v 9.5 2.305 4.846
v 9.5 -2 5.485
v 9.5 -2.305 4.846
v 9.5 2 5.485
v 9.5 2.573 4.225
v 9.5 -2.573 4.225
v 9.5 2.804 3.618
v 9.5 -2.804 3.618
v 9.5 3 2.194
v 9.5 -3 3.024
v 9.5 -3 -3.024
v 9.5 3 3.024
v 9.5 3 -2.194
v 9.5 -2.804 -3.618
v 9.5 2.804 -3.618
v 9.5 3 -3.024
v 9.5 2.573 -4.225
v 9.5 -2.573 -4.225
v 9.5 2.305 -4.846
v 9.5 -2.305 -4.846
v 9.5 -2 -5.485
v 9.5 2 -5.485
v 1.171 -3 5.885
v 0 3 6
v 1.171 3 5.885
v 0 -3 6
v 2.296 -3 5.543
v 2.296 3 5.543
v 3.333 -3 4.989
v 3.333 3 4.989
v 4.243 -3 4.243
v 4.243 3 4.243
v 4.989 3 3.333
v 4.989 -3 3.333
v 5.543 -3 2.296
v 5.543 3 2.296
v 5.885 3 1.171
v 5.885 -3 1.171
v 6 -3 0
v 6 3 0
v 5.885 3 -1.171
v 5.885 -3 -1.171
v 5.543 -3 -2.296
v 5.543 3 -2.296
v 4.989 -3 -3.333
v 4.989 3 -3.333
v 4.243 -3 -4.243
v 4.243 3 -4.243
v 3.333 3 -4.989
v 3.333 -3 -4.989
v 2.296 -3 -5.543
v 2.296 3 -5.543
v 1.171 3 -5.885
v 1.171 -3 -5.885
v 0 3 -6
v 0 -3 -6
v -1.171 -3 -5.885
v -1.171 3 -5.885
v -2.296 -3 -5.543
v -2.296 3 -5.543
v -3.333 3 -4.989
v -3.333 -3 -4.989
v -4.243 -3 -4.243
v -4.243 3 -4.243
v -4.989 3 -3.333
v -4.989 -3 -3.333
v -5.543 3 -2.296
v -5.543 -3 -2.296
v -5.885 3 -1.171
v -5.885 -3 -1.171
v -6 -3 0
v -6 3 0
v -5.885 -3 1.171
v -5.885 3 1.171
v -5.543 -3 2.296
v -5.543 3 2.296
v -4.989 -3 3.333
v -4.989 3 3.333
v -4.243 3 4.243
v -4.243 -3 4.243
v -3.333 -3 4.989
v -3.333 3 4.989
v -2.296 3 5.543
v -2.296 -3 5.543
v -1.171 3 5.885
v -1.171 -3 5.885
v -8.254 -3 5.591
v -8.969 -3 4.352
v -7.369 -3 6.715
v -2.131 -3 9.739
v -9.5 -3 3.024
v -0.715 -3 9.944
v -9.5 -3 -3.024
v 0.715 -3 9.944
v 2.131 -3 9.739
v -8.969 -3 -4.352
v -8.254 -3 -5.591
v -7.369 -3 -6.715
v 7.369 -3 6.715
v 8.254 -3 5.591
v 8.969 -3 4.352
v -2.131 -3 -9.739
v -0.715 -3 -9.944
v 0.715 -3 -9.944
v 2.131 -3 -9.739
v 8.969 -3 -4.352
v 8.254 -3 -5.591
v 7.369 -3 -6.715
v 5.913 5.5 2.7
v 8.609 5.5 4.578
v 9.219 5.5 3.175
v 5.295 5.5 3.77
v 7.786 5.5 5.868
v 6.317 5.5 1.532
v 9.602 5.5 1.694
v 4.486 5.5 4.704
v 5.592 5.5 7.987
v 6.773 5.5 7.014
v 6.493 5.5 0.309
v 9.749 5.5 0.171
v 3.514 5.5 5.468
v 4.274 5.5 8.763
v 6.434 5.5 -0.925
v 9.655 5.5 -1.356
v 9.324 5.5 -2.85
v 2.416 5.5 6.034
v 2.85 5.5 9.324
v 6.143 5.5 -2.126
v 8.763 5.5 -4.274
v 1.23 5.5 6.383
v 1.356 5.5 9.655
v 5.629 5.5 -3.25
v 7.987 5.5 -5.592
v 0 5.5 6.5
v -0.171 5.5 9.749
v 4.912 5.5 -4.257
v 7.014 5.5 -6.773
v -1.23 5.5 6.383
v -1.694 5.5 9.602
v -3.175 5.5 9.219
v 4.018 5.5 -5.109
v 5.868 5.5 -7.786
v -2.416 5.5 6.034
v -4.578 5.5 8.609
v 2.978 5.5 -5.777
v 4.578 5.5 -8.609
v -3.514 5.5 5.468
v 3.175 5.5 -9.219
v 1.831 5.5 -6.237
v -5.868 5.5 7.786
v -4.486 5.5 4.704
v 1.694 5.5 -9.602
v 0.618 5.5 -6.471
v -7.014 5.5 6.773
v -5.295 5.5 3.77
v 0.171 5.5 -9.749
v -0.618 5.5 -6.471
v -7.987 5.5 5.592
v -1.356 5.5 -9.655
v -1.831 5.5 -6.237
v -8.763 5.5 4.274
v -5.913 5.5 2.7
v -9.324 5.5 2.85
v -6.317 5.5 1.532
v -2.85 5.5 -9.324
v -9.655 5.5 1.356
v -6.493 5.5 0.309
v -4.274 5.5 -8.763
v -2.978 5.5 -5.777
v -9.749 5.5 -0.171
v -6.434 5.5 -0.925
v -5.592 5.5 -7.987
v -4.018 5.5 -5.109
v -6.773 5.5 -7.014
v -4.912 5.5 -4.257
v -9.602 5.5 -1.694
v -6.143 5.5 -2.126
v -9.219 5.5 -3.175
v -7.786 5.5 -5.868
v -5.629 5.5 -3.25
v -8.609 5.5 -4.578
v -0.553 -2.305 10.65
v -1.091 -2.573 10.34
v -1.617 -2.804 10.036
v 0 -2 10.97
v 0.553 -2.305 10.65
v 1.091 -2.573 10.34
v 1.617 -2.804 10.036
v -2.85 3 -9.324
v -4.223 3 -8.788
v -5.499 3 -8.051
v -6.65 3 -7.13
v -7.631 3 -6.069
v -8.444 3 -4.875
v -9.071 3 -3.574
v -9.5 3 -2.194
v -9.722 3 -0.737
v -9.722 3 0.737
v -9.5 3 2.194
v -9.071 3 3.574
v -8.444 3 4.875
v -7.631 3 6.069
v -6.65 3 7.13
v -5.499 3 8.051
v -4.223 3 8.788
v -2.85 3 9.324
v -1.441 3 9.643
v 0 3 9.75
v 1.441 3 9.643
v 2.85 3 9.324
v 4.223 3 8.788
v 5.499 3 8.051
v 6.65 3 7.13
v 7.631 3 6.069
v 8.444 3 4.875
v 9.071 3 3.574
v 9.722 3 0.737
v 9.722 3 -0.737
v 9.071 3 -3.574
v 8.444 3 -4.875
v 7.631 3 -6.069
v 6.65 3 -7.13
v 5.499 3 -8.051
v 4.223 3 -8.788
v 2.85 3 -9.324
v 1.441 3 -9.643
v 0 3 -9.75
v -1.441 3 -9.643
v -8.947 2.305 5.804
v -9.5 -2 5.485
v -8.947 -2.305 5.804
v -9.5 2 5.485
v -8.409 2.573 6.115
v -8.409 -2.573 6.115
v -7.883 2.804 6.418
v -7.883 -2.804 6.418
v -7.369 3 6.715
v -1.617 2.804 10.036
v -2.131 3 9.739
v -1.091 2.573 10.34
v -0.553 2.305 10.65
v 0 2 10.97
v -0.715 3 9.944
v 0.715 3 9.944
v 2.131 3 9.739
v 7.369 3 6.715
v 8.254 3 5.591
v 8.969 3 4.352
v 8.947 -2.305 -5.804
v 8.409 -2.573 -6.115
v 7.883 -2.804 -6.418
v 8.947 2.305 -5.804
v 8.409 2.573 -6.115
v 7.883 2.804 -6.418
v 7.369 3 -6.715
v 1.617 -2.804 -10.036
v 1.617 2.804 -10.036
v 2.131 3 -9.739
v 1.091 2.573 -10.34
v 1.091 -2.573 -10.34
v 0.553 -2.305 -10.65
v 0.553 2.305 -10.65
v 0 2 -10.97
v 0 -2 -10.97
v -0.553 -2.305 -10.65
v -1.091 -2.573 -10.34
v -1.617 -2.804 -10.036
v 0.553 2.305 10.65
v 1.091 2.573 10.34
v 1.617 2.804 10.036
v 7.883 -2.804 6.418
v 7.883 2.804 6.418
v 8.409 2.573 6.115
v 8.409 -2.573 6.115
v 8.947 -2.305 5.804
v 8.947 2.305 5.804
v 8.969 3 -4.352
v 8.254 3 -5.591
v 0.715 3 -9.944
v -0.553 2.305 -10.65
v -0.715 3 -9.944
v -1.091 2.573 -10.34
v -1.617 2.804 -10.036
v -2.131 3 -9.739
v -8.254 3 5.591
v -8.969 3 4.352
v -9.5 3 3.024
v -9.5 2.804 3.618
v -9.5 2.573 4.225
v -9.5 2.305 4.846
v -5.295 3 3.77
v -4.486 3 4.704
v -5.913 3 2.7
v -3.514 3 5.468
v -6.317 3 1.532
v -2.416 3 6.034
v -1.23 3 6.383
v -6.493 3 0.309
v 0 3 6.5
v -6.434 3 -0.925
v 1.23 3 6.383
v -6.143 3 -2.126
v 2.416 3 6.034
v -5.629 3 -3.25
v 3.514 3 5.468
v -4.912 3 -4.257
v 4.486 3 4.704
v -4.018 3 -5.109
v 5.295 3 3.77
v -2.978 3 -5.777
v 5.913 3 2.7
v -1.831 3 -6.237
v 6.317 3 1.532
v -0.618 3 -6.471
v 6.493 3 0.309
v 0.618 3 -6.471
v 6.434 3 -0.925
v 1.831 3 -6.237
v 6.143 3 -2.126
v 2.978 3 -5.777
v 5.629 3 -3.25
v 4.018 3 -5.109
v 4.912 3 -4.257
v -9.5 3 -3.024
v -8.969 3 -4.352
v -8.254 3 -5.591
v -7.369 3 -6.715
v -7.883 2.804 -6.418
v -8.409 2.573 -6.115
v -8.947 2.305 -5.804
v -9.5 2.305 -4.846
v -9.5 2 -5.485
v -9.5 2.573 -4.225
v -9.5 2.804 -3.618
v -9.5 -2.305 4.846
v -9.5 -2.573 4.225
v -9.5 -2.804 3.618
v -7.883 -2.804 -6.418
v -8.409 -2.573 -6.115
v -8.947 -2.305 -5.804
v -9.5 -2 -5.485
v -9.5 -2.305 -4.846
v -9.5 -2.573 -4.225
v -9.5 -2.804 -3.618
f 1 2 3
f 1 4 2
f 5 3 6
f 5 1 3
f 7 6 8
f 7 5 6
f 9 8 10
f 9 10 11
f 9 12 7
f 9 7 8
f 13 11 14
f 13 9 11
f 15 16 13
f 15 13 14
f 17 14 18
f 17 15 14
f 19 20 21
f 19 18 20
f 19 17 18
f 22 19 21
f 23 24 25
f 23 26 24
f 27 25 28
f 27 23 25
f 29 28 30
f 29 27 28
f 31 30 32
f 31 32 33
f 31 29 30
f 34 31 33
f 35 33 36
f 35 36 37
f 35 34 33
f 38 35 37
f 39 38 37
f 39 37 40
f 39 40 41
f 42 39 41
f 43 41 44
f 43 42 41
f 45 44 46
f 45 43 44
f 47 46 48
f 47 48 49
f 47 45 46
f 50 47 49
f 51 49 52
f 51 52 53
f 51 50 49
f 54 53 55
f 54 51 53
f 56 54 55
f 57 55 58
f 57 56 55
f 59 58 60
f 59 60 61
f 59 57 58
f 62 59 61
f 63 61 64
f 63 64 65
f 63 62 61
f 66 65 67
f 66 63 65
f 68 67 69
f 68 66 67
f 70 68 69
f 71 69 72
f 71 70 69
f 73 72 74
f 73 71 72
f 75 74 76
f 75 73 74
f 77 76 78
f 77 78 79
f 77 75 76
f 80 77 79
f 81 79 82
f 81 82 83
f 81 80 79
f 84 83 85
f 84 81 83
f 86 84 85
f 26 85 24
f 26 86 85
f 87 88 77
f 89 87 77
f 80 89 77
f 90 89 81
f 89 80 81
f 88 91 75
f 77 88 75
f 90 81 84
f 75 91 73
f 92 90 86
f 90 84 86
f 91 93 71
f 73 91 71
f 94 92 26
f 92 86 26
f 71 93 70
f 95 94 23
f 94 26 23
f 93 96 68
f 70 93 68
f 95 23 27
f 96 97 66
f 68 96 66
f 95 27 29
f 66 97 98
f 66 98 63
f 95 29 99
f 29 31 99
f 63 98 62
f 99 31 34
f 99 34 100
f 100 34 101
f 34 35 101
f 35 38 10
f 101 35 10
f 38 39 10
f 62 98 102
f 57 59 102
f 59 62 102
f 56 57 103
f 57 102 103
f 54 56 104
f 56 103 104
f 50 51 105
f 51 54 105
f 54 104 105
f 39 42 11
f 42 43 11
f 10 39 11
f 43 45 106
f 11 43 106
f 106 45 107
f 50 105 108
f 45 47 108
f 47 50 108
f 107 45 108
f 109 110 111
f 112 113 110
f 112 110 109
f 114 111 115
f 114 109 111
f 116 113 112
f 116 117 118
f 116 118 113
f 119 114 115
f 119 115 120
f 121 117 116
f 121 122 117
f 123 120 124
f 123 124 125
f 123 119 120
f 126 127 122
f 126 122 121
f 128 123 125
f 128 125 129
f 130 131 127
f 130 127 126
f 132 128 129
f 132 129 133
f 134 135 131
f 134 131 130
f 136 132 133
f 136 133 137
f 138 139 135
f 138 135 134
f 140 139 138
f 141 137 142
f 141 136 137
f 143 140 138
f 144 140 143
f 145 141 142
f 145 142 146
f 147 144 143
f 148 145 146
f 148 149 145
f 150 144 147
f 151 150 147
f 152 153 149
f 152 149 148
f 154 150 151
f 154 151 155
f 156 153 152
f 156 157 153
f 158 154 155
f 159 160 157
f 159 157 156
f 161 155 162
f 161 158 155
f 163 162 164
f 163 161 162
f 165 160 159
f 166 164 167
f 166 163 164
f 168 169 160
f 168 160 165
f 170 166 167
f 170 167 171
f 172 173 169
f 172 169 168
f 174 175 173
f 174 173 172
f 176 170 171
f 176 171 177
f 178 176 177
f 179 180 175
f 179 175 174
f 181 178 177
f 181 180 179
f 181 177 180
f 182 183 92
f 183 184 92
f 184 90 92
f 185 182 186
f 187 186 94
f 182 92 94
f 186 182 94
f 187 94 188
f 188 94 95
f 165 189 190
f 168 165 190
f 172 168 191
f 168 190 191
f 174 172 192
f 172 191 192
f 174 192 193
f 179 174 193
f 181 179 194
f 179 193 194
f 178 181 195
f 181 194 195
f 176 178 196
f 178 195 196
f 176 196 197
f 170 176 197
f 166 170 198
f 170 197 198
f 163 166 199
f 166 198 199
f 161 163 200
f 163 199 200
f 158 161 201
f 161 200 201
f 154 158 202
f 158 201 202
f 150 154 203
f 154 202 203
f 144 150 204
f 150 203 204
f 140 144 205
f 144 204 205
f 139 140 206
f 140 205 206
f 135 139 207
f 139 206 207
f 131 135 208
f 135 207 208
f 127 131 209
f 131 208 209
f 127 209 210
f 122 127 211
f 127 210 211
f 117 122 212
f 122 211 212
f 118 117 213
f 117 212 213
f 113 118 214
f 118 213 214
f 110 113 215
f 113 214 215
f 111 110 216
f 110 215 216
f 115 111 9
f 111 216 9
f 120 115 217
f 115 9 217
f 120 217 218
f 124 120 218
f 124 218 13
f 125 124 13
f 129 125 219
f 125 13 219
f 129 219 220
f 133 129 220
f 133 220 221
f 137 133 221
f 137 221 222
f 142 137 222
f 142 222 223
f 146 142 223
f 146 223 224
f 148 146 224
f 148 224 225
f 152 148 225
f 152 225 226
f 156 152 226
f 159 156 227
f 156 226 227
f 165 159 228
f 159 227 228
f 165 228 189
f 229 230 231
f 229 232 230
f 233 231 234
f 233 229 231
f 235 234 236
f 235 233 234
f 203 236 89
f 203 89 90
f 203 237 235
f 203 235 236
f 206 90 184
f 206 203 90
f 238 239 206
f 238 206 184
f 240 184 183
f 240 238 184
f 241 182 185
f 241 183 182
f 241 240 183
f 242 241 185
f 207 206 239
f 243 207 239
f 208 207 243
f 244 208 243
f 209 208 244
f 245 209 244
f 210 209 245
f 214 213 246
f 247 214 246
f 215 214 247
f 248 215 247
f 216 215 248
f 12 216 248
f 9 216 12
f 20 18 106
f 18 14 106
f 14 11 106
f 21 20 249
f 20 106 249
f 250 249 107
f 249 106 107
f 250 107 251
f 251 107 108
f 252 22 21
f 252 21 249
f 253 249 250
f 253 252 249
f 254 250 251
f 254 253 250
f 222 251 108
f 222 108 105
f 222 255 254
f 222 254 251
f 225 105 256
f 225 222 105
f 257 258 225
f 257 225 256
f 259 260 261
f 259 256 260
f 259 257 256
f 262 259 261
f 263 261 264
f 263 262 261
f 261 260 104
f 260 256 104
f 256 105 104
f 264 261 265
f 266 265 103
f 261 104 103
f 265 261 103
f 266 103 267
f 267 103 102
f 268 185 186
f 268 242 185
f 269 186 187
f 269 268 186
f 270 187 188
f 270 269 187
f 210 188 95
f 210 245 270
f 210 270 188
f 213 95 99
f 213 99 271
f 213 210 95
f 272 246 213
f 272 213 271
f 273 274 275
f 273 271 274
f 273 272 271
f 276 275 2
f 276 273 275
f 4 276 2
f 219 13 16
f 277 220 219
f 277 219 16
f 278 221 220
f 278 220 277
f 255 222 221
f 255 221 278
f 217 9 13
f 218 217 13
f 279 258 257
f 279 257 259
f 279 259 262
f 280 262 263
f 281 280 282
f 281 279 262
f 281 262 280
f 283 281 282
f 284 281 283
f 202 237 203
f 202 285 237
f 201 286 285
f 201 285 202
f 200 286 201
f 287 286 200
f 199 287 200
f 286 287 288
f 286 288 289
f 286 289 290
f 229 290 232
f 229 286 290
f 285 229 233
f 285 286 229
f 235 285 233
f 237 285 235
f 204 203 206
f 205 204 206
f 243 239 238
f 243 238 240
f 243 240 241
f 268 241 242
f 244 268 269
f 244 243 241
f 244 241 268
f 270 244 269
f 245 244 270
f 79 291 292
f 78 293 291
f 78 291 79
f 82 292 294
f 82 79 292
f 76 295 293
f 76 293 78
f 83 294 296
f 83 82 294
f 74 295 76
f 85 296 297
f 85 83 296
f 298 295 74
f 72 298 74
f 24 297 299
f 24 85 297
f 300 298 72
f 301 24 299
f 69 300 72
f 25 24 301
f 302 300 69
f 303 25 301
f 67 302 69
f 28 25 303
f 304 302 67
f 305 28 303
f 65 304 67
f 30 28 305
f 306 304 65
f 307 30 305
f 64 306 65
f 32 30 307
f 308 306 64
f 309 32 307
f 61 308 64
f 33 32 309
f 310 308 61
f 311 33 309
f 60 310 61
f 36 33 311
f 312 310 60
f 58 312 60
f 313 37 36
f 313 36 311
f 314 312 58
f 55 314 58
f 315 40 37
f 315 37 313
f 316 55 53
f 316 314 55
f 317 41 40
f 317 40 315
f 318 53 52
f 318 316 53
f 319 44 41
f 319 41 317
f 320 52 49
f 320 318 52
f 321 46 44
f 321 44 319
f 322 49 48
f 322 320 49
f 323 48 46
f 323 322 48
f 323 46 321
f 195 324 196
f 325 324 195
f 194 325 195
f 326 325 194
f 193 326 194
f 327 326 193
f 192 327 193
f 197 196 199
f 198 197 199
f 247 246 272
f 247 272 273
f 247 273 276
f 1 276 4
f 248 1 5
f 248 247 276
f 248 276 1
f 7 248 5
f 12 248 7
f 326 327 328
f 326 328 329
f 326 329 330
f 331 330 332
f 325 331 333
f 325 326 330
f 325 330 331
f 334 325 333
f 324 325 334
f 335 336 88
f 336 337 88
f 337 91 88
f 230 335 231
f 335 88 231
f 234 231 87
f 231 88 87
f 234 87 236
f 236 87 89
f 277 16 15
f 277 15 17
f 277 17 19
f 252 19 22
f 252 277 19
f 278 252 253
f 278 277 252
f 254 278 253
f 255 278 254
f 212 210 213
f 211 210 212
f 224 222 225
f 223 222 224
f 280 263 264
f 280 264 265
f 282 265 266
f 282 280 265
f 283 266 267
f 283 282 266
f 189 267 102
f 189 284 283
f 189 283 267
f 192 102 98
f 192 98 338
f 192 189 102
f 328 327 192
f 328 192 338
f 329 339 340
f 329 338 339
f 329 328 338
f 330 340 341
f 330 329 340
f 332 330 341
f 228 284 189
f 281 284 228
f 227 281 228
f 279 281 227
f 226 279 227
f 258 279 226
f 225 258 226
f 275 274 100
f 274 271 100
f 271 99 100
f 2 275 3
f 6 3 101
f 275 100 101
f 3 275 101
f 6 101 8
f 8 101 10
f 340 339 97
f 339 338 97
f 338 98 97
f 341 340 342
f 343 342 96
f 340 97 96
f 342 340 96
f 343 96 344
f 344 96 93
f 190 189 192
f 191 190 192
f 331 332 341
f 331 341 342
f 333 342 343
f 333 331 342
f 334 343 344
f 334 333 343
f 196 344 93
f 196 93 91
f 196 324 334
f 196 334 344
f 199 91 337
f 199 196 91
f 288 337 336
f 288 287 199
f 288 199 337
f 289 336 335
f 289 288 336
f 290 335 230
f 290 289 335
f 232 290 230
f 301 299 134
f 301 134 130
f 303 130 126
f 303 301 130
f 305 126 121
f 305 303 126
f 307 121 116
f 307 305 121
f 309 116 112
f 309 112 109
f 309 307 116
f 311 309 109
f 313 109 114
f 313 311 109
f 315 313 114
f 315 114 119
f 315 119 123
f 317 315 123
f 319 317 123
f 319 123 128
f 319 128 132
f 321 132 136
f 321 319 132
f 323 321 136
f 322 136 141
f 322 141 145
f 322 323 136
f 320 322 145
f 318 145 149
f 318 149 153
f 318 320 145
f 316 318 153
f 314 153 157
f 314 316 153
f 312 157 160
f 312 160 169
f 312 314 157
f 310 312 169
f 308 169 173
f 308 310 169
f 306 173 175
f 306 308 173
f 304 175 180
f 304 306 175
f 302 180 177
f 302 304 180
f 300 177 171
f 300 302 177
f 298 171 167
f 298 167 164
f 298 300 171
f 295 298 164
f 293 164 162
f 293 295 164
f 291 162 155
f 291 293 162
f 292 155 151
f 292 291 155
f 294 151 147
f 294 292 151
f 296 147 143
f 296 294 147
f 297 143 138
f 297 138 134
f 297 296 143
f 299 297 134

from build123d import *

# Parameters (mm, degrees)
SZKIC1_R                    = 6
DODANIE_WYCI_GNI_CIE1_DEPTH = 3
SZKIC4_R                    = 9.75
SZKIC4_R_2                  = 6.5
DODANIE_WYCI_GNI_CIE2_DEPTH = 2.5


with BuildPart() as part:
    # Szkic1 → Dodanie-wyciągnięcie1 (new, symmetric)
    with BuildSketch(Plane(origin=(0, 0, 0), x_dir=(1, 0, 0), z_dir=(0, 1, 0))):
        Polygon((9.5, -5.484827557), (9.5, 5.484827557), (0, 10.969655115), (-9.5, 5.484827557), (-9.5, -5.484827557), (0, -10.969655115), align=None)
        with Locations(Location((0, 0, 0), (0, 0, 270))):
            Circle(SZKIC1_R, mode=Mode.SUBTRACT)
    extrude(amount=DODANIE_WYCI_GNI_CIE1_DEPTH, both=True)

    # Szkic3 → Wycięcie-obrót9 (revolve, cut)
    with BuildSketch(Plane(origin=(0, 0, 0), x_dir=(0, 0, -1), z_dir=(1, 0, 0))):
        Polygon((10.969655115, 3), (10.969655115, 2), (9.969655115, 3), align=None)
        Polygon((9.969655115, -3), (10.969655115, -3), (10.969655115, -2), align=None)
    revolve(axis=Axis((0, 0, 0), (0, 1, 0)), mode=Mode.SUBTRACT)

    # Szkic4 → Dodanie-wyciągnięcie2 (add)
    with BuildSketch(Plane(origin=(0, 3, 0), x_dir=(1, 0, 0), z_dir=(0, 1, 0))):
        with Locations(Location((0, 0, 0), (0, 0, 106.997175533))):
            Circle(SZKIC4_R)
        with Locations(Location((0, 0, 0), (0, 0, 270))):
            Circle(SZKIC4_R_2, mode=Mode.SUBTRACT)
    extrude(amount=DODANIE_WYCI_GNI_CIE2_DEPTH)


solid = part.part
